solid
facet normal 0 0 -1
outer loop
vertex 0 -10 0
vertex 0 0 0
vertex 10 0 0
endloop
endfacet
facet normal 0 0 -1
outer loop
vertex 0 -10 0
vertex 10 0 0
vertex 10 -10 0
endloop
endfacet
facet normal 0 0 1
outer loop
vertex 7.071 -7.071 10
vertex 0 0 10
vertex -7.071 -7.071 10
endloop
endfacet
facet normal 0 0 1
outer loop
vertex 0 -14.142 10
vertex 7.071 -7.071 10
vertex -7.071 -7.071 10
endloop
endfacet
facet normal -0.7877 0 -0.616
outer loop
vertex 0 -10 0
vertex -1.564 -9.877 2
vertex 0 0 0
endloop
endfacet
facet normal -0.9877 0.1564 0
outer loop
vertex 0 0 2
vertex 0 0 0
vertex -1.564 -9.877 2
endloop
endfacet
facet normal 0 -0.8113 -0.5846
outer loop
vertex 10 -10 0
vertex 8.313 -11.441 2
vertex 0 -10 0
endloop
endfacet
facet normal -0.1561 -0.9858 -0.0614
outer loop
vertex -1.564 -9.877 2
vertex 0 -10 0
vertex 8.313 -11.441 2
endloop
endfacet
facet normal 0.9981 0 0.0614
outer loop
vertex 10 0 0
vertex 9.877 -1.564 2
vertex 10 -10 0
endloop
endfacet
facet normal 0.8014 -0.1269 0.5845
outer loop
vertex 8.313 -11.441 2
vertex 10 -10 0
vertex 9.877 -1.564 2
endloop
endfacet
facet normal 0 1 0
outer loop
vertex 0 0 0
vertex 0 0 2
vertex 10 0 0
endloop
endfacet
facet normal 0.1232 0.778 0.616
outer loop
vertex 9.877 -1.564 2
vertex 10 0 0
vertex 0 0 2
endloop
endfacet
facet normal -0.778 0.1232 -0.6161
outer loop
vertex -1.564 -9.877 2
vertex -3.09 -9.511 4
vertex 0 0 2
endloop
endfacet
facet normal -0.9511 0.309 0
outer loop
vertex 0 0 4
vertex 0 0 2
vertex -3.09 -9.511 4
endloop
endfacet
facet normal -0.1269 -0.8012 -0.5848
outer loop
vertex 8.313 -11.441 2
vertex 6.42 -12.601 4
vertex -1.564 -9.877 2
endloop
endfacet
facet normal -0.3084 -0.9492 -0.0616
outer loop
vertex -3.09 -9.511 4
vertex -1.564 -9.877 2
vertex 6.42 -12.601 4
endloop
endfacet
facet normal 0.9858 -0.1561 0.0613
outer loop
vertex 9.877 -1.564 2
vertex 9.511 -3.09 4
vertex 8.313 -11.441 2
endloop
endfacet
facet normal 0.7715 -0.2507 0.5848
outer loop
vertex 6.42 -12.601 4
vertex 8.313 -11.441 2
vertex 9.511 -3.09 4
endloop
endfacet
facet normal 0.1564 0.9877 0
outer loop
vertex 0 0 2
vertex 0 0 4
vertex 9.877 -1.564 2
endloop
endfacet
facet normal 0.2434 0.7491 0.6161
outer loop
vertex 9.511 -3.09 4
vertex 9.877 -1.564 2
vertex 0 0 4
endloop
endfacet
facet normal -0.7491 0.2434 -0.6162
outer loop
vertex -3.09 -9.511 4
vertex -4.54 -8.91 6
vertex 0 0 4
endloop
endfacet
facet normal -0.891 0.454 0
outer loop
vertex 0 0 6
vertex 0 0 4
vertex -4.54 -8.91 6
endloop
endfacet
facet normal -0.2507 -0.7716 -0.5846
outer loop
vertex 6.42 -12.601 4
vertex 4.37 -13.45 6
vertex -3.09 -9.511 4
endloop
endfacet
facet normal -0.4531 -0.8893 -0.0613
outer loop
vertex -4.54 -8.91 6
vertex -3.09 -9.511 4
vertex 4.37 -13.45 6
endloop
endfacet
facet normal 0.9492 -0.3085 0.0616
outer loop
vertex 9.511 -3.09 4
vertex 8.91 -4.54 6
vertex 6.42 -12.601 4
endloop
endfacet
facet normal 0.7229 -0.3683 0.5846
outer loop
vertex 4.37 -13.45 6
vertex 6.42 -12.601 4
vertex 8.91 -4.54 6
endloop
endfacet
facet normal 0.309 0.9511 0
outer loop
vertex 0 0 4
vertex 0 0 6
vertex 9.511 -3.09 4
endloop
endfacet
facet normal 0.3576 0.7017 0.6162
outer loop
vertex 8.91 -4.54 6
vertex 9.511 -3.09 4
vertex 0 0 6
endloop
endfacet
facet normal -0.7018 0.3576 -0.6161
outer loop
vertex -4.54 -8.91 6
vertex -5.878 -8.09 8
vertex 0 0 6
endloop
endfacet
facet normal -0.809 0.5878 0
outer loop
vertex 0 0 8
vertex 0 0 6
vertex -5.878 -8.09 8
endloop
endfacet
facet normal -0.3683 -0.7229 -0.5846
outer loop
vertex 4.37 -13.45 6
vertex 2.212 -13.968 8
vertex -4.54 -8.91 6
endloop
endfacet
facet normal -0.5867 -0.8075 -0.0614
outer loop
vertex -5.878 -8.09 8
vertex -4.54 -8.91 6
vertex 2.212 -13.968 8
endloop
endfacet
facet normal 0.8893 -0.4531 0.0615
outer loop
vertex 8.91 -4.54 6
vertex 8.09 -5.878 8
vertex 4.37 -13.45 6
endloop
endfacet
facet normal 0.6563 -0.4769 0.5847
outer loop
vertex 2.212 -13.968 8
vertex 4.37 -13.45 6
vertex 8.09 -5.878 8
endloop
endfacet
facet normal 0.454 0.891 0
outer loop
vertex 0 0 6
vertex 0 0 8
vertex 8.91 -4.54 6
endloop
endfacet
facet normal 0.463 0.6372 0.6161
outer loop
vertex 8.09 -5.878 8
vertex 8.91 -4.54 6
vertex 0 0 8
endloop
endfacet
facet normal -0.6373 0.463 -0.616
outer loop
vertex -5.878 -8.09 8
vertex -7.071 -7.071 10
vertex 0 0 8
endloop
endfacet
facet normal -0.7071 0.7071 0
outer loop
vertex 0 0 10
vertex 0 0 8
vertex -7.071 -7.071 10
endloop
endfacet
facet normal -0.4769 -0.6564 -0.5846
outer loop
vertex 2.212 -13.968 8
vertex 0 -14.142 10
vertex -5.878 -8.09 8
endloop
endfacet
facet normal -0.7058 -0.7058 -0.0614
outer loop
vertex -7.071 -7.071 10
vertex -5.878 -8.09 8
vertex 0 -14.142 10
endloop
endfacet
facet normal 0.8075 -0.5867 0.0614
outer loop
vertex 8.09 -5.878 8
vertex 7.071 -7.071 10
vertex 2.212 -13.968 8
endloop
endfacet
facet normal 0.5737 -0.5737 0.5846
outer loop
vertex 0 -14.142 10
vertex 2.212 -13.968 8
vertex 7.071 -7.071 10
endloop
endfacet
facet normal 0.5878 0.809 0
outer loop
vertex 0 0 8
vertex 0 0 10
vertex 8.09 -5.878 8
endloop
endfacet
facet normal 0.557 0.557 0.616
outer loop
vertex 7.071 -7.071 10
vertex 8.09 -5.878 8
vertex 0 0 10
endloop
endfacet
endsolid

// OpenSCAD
$fn = 40; 

module twube() {
    linear_extrude(10, convexity=10, twist=45) square(10);
}

//twube();
//rotate([0,0,90]) twube();
//rotate([0,0,180]) twube();
rotate([0,0,270]) twube();
